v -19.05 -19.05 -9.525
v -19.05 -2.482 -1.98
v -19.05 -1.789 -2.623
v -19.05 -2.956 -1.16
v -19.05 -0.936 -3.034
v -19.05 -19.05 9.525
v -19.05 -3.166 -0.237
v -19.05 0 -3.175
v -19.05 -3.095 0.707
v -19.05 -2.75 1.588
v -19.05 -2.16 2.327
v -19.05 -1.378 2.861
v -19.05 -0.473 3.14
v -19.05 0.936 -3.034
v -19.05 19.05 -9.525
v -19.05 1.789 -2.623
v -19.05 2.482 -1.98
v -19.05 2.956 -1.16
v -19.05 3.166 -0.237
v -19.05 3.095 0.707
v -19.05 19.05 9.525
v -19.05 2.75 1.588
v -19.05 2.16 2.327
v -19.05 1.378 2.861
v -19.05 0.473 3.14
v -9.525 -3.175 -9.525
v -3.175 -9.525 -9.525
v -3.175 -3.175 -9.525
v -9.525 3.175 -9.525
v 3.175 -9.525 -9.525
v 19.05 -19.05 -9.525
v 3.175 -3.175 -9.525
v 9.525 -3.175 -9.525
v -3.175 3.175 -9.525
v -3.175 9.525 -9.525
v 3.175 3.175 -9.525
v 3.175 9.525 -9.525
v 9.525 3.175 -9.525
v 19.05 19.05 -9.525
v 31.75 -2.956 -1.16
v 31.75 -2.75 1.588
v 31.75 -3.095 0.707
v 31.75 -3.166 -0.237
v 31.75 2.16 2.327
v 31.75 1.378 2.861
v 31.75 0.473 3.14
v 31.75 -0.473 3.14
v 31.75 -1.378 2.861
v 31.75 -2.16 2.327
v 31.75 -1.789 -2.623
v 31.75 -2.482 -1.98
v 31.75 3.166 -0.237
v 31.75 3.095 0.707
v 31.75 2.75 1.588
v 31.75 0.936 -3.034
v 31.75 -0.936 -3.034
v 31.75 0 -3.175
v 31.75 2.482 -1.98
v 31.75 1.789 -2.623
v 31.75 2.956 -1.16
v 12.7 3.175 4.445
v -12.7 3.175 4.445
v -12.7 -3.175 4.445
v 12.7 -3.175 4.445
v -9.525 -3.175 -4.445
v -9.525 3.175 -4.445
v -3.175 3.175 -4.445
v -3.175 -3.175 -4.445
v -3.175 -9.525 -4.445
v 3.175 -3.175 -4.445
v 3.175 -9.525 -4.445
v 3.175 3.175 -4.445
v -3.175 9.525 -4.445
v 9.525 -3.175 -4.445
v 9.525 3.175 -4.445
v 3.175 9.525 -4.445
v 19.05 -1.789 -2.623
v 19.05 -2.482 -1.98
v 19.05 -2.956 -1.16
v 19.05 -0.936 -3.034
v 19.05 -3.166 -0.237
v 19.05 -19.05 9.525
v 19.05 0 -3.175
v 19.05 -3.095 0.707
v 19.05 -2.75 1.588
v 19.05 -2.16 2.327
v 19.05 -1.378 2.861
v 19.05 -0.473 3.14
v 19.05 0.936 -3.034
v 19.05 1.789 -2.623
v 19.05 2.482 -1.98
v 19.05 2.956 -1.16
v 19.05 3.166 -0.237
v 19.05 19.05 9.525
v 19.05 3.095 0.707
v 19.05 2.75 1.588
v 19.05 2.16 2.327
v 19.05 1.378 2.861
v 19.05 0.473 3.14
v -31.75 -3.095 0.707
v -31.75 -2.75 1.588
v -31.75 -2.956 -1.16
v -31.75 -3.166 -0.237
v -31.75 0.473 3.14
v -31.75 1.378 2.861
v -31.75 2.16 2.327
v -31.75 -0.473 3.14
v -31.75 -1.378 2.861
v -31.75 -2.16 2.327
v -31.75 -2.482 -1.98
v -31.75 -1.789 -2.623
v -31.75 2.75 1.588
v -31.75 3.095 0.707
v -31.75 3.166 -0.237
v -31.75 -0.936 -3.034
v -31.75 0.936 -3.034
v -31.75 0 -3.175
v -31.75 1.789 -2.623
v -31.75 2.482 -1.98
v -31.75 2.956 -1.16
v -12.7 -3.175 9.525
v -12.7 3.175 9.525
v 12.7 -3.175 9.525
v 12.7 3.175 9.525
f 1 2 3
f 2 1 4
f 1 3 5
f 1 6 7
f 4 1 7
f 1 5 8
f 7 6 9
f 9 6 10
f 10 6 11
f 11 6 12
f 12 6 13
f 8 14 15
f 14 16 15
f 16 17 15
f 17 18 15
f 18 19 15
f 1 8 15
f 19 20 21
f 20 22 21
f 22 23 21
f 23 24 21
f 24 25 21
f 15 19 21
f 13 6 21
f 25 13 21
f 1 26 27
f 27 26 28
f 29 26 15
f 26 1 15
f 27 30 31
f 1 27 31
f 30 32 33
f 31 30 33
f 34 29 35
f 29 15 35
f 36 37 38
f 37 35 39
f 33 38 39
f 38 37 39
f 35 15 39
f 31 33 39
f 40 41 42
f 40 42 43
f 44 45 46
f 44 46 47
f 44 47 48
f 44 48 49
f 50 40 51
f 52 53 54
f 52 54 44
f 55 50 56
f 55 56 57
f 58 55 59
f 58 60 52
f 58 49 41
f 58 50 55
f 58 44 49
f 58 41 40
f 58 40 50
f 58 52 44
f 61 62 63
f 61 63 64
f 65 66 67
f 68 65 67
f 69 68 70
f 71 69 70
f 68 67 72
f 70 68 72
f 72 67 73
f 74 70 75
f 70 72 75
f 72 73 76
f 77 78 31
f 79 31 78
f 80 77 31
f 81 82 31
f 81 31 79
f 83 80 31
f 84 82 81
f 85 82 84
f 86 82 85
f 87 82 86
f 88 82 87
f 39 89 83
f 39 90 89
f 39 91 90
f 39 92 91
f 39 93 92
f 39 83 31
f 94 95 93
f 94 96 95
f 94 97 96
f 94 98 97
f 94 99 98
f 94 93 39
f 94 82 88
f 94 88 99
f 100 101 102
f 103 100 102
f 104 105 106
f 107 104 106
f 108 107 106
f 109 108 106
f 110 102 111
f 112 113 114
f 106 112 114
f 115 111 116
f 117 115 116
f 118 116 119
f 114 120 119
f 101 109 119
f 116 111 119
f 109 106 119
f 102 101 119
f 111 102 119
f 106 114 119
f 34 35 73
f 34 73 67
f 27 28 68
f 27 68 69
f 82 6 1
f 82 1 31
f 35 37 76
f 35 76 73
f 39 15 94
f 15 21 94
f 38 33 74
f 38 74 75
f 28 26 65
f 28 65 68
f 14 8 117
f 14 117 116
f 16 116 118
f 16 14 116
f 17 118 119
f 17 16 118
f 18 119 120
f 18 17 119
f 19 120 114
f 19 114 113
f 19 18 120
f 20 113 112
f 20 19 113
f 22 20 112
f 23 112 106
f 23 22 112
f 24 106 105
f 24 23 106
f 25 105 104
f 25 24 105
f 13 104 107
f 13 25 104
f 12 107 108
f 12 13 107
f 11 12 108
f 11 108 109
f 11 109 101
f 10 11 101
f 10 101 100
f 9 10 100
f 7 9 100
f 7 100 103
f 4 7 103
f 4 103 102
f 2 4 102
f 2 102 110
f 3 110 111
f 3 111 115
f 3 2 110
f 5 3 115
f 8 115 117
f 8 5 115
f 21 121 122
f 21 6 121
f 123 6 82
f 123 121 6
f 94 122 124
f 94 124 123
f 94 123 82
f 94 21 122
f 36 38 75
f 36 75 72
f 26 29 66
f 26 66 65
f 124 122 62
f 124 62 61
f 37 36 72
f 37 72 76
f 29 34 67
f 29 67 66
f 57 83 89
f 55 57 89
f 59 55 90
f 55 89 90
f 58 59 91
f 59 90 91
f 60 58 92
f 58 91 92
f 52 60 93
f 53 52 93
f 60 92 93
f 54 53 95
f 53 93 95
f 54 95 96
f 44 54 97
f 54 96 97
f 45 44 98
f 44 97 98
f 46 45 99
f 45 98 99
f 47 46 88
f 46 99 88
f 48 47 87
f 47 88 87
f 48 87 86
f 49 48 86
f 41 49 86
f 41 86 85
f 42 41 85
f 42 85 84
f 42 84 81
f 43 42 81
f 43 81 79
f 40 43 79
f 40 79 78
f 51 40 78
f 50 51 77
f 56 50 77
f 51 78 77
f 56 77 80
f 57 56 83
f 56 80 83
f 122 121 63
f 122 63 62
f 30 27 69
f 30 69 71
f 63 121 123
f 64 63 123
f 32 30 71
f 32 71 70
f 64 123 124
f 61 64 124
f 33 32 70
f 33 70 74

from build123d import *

# Parameters (mm, degrees)
SKETCH1_W           = 38.1
SKETCH1_H           = 38.1
BOSS_EXTRUDE1_DEPTH = 9.525
SKETCH2_W           = 25.4
SKETCH2_H           = 6.35
CUT_EXTRUDE1_DEPTH  = 5.08
CUT_EXTRUDE2_DEPTH  = 5.08
SKETCH4_R           = 3.175
BOSS_EXTRUDE2_DEPTH = 12.7


with BuildPart() as part:
    # Sketch1 → Boss-Extrude1 (new body, symmetric)
    with BuildSketch(Plane.XY):
        Rectangle(SKETCH1_W, SKETCH1_H)
    extrude(amount=BOSS_EXTRUDE1_DEPTH, both=True)

    # Sketch2 → Cut-Extrude1 (cut)
    with BuildSketch(Plane.XY.offset(9.525)):
        Rectangle(SKETCH2_W, SKETCH2_H)
    extrude(amount=-CUT_EXTRUDE1_DEPTH, mode=Mode.SUBTRACT)

    # Sketch3 → Cut-Extrude2 (cut)
    with BuildSketch(Plane(origin=(0, 0, -9.525), x_dir=(-1, 0, 0), z_dir=(0, 0, -1))):
        Polygon((3.175, 3.175), (9.525, 3.175), (9.525, -3.175), (3.175, -3.175), (3.175, -9.525), (-3.175, -9.525), (-3.175, -3.175), (-9.525, -3.175), (-9.525, 3.175), (-3.175, 3.175), (-3.175, 9.525), (3.175, 9.525), align=None)
    extrude(amount=-CUT_EXTRUDE2_DEPTH, mode=Mode.SUBTRACT)

    # Sketch4 → Boss-Extrude2 (add)
    with BuildSketch(Plane(origin=(19.05, 0, 0), x_dir=(0, 0, -1), z_dir=(1, 0, 0))):
        Circle(SKETCH4_R)
    boss_extrude2 = extrude(amount=BOSS_EXTRUDE2_DEPTH)

    # Mirror1: Boss-Extrude2 across plane
    add(boss_extrude2.mirror(Plane(origin=(0, 0, 0), x_dir=(0, 0, 1), z_dir=(1, 0, 0))))


solid = part.part
